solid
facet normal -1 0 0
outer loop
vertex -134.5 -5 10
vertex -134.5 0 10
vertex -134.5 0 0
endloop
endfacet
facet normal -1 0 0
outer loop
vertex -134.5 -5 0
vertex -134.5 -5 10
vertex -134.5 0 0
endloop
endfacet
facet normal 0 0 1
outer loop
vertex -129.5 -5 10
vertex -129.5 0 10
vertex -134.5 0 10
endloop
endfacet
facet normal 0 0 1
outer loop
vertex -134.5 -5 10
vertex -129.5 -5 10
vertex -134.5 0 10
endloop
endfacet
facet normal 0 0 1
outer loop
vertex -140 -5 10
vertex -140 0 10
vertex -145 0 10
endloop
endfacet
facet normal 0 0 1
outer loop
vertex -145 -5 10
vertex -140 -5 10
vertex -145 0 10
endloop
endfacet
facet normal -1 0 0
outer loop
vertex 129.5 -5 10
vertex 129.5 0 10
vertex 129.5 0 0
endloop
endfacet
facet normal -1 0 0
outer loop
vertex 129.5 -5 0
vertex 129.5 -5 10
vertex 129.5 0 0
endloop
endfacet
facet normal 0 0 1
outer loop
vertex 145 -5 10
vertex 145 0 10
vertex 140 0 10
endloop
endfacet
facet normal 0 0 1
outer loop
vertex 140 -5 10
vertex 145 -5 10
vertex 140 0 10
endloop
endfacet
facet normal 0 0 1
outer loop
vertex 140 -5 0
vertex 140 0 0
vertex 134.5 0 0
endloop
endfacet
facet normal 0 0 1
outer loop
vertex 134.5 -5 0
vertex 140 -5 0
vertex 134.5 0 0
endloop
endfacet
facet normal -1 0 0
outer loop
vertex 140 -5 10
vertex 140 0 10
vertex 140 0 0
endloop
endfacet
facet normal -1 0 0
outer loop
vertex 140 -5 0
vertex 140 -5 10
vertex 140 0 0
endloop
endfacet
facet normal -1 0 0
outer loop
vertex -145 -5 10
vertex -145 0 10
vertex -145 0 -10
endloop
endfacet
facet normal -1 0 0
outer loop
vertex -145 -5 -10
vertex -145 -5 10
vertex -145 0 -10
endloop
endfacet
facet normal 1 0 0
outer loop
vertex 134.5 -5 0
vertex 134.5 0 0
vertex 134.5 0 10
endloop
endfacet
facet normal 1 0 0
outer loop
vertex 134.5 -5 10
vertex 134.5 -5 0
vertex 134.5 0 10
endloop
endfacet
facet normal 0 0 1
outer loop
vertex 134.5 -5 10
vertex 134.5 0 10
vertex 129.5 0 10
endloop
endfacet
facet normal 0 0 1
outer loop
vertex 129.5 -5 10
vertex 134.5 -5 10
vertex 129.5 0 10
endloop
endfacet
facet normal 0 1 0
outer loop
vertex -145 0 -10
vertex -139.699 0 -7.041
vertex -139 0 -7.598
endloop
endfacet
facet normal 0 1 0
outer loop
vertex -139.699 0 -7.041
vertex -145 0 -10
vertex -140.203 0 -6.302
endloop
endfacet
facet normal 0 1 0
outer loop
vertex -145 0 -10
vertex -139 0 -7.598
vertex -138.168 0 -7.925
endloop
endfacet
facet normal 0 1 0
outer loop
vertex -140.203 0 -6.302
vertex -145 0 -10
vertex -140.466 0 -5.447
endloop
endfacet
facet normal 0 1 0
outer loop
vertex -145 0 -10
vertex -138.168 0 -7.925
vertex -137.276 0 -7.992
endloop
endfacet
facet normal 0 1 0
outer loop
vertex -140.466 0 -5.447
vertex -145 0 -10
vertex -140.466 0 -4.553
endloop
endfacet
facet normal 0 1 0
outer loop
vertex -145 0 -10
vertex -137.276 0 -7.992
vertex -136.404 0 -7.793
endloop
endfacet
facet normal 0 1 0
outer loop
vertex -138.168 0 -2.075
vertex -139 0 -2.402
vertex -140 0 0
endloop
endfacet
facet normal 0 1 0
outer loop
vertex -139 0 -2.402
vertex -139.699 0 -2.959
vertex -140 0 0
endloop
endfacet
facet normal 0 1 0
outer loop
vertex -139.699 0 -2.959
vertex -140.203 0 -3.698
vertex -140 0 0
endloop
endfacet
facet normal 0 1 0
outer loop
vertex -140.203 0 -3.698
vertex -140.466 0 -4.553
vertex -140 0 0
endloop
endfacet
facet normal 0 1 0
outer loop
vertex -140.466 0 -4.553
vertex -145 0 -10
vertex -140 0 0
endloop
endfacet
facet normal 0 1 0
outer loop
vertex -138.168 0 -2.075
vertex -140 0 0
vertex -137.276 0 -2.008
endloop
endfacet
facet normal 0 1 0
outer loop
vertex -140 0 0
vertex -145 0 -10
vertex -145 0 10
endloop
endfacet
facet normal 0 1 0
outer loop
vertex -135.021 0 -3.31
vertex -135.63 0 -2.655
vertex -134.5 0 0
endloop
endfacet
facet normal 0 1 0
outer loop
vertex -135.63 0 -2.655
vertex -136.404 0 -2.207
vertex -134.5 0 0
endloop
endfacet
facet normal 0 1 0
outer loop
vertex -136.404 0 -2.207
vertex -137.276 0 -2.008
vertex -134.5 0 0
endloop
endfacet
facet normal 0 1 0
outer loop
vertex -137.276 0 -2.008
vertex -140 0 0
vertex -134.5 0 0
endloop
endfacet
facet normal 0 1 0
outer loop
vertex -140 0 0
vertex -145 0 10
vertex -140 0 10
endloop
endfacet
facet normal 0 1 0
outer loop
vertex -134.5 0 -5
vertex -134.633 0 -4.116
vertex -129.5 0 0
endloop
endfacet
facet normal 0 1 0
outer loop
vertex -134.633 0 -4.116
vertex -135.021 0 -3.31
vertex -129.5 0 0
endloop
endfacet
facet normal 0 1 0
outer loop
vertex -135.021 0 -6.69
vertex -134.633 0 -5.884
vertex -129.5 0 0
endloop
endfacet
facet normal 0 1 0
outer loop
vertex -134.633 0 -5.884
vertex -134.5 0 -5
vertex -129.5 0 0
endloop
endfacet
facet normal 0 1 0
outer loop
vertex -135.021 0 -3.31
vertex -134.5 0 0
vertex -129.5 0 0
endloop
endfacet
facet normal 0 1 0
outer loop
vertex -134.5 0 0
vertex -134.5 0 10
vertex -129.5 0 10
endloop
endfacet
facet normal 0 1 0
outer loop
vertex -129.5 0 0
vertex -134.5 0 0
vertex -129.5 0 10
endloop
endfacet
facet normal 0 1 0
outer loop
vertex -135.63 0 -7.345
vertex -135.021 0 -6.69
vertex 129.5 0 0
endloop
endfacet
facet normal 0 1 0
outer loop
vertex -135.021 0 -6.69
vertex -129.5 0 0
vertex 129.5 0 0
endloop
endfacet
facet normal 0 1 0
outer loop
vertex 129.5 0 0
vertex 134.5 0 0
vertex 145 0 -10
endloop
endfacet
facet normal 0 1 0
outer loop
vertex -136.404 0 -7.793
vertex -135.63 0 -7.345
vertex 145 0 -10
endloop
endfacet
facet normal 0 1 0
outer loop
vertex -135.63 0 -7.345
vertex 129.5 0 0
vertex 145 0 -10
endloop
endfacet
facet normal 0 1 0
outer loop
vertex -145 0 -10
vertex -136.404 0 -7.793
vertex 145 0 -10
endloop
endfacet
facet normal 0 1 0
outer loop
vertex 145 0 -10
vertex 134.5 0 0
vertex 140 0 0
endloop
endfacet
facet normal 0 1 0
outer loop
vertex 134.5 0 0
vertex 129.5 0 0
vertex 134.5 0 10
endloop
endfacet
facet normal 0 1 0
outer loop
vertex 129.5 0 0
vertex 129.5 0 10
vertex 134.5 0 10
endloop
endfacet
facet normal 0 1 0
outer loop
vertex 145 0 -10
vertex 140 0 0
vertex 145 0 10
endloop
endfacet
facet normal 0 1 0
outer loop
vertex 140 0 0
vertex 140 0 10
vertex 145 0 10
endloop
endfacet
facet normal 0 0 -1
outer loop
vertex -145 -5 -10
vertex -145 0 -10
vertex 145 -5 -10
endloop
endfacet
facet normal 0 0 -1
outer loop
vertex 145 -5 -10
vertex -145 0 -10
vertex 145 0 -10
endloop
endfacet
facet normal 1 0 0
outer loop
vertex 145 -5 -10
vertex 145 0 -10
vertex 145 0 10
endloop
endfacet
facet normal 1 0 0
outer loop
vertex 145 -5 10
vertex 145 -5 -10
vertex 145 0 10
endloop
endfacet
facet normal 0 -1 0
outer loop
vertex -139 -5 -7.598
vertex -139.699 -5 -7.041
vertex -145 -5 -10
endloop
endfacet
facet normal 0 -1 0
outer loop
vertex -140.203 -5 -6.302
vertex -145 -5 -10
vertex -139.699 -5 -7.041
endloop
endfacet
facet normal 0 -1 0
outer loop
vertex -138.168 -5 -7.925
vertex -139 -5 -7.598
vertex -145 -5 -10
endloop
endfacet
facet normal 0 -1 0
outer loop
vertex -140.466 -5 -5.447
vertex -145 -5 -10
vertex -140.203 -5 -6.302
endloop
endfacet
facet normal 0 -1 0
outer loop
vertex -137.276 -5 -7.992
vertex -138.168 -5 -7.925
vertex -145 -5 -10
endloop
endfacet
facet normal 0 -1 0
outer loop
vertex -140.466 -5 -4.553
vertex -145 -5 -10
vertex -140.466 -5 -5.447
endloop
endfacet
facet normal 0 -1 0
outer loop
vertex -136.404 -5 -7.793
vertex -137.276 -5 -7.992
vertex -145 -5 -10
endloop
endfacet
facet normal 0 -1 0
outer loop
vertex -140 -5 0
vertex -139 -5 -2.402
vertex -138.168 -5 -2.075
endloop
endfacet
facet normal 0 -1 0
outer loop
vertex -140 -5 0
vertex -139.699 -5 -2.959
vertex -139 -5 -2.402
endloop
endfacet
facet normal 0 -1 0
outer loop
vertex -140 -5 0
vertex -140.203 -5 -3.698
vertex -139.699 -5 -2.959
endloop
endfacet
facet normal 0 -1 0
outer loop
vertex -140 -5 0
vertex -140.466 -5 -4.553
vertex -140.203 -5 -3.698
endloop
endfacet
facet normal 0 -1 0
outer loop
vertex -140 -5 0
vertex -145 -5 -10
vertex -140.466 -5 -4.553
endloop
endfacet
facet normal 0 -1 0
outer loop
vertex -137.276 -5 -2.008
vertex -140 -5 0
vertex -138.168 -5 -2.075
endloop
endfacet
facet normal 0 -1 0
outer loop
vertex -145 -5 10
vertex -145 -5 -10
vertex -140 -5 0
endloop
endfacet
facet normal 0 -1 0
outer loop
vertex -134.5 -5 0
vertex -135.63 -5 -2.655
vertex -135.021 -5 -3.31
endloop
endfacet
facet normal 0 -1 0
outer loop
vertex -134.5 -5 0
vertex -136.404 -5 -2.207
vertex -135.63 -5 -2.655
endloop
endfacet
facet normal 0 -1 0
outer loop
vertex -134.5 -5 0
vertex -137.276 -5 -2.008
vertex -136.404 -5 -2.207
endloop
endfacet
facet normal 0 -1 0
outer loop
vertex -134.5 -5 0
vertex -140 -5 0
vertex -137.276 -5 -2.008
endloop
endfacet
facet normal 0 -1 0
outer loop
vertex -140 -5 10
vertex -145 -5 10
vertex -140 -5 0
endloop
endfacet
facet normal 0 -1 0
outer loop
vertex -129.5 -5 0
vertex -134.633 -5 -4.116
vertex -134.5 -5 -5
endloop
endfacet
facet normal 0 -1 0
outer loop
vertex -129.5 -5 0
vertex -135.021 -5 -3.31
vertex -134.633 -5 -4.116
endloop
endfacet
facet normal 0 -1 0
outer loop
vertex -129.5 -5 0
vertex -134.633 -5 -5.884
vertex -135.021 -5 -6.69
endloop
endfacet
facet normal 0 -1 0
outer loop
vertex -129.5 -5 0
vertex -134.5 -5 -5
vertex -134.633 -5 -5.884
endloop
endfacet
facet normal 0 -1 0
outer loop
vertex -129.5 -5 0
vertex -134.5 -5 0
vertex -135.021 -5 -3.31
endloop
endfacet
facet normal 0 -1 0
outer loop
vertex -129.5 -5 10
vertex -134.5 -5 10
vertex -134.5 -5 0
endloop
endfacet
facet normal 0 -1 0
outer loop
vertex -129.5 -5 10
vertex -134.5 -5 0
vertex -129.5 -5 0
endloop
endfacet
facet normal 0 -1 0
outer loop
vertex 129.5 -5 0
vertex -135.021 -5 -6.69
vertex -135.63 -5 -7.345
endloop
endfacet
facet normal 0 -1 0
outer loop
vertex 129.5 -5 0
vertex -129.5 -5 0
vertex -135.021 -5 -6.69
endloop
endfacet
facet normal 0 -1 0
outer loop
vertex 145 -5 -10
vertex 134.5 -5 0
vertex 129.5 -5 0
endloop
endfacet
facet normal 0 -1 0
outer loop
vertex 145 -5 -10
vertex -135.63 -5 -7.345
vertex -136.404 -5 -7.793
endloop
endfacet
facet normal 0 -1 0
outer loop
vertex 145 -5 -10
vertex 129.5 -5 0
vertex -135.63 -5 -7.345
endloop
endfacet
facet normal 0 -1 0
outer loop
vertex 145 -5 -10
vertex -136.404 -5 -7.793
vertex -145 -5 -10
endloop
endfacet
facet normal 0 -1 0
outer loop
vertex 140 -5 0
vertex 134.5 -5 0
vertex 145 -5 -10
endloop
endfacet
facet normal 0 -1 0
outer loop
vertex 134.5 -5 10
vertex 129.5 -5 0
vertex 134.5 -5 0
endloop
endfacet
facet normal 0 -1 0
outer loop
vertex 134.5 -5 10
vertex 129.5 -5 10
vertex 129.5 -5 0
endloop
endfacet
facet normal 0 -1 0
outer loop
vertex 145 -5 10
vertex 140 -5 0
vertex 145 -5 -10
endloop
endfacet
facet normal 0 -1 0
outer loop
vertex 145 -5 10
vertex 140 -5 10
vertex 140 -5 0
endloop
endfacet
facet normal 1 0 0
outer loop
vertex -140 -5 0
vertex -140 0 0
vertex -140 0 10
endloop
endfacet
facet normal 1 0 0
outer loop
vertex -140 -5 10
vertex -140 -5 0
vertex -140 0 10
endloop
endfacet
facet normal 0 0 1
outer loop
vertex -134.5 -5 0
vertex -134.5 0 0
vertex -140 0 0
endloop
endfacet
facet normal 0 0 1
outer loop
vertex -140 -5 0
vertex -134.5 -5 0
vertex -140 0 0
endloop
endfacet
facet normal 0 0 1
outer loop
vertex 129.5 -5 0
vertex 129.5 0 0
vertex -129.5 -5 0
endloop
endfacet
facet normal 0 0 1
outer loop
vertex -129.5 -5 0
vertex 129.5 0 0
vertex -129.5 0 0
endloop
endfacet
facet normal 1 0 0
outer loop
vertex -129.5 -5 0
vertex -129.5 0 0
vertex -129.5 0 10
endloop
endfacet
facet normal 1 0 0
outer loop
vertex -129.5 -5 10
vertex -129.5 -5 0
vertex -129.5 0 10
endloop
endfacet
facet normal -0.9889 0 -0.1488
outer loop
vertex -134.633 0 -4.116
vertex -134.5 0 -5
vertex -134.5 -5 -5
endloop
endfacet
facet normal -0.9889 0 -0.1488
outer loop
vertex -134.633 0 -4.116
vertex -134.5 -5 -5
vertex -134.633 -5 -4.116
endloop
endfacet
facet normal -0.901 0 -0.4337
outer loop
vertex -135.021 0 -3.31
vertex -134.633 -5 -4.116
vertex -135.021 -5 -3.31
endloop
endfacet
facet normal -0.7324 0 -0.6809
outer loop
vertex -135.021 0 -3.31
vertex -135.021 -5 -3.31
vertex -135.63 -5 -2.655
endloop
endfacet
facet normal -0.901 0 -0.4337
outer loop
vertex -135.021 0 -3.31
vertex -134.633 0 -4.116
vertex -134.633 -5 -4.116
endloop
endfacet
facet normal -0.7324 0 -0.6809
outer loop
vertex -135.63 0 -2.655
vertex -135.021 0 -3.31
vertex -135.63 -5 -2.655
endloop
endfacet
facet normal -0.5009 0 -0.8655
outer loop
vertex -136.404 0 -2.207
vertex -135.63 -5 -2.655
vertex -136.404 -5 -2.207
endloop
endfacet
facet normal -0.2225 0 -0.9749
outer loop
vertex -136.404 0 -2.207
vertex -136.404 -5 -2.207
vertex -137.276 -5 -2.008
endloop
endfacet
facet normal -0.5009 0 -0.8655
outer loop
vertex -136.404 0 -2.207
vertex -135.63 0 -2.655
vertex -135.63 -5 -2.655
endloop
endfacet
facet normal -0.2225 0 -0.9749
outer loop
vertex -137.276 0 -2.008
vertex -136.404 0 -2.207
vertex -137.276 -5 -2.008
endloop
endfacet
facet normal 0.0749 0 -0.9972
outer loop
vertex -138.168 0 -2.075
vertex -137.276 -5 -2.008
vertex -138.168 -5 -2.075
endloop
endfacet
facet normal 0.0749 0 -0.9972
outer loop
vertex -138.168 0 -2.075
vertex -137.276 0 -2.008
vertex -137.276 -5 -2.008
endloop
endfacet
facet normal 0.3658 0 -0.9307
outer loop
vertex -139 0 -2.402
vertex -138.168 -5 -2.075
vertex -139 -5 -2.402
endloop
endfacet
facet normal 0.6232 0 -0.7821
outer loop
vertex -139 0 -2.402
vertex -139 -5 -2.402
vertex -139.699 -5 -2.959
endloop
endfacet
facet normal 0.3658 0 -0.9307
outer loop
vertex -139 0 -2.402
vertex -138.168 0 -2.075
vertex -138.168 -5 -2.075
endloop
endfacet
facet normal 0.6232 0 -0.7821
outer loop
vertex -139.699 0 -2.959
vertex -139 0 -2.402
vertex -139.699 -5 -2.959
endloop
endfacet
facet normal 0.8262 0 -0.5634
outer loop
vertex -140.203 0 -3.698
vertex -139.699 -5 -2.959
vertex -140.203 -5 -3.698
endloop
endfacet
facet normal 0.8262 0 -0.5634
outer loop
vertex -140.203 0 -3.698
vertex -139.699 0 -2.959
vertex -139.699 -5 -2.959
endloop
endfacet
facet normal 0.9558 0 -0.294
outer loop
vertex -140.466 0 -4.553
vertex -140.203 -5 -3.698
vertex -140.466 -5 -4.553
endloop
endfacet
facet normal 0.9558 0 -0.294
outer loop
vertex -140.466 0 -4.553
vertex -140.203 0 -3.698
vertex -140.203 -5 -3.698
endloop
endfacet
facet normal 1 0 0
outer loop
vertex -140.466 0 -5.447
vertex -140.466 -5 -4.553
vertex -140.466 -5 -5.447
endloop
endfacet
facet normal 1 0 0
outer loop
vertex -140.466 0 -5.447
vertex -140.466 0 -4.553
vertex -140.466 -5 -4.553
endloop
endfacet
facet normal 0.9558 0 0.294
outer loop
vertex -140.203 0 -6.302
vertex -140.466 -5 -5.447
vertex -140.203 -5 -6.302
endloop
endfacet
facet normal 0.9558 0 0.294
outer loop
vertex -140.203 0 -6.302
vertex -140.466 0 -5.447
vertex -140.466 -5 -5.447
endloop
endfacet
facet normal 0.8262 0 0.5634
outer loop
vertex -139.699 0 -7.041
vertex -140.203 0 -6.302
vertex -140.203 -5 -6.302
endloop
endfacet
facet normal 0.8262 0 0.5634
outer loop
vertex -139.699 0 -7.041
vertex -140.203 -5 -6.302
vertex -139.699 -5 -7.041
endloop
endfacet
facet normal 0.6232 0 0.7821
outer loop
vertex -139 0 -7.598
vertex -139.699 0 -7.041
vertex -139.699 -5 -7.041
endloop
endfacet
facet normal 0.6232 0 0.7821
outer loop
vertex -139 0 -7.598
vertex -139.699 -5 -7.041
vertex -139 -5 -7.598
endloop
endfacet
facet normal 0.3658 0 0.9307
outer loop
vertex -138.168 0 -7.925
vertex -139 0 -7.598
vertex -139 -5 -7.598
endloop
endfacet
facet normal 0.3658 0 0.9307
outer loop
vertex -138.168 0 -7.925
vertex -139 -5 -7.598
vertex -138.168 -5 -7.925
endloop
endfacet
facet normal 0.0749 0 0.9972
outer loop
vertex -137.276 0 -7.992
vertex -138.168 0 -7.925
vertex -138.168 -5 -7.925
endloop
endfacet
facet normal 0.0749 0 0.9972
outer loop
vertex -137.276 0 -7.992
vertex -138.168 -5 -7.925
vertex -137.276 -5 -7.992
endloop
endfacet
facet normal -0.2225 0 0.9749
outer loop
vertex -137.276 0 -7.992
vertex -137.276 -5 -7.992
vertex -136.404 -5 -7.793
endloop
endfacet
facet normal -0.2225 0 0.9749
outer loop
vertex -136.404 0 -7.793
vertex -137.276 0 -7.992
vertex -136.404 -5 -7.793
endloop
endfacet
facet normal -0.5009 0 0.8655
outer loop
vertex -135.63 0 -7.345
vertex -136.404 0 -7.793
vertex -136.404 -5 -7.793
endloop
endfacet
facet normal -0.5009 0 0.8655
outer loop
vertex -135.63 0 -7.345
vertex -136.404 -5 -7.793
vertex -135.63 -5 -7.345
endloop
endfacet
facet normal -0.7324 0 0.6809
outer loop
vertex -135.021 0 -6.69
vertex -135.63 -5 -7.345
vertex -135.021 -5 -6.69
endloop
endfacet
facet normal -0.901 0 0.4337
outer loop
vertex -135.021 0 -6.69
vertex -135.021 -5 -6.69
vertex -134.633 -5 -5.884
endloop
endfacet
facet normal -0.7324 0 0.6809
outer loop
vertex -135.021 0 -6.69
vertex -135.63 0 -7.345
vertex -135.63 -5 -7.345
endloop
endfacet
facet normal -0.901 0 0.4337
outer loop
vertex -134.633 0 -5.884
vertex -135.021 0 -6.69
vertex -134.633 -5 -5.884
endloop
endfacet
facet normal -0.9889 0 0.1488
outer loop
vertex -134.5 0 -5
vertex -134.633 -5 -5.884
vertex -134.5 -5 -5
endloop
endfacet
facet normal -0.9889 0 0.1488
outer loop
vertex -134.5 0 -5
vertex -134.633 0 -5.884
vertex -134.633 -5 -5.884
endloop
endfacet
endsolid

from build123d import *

# Parameters (mm, degrees)
F0_R     = 3
F1_DEPTH = 5


with BuildPart() as f1:
    # F0 (on Front) → F1 (new body)
    with BuildSketch(Plane.XZ):
        Polygon((-145, -10), (145, -10), (145, 10), (140, 10), (140, 0), (134.5, 0), (134.5, 10), (129.5, 10), (129.5, 0), (-129.5, 0), (-129.5, 10), (-134.5, 10), (-134.5, 0), (-140, 0), (-140, 10), (-145, 10), align=None)
        with Locations((-137.5, -5)):
            Circle(F0_R, mode=Mode.SUBTRACT)
    extrude(amount=F1_DEPTH)


solid = f1.part
